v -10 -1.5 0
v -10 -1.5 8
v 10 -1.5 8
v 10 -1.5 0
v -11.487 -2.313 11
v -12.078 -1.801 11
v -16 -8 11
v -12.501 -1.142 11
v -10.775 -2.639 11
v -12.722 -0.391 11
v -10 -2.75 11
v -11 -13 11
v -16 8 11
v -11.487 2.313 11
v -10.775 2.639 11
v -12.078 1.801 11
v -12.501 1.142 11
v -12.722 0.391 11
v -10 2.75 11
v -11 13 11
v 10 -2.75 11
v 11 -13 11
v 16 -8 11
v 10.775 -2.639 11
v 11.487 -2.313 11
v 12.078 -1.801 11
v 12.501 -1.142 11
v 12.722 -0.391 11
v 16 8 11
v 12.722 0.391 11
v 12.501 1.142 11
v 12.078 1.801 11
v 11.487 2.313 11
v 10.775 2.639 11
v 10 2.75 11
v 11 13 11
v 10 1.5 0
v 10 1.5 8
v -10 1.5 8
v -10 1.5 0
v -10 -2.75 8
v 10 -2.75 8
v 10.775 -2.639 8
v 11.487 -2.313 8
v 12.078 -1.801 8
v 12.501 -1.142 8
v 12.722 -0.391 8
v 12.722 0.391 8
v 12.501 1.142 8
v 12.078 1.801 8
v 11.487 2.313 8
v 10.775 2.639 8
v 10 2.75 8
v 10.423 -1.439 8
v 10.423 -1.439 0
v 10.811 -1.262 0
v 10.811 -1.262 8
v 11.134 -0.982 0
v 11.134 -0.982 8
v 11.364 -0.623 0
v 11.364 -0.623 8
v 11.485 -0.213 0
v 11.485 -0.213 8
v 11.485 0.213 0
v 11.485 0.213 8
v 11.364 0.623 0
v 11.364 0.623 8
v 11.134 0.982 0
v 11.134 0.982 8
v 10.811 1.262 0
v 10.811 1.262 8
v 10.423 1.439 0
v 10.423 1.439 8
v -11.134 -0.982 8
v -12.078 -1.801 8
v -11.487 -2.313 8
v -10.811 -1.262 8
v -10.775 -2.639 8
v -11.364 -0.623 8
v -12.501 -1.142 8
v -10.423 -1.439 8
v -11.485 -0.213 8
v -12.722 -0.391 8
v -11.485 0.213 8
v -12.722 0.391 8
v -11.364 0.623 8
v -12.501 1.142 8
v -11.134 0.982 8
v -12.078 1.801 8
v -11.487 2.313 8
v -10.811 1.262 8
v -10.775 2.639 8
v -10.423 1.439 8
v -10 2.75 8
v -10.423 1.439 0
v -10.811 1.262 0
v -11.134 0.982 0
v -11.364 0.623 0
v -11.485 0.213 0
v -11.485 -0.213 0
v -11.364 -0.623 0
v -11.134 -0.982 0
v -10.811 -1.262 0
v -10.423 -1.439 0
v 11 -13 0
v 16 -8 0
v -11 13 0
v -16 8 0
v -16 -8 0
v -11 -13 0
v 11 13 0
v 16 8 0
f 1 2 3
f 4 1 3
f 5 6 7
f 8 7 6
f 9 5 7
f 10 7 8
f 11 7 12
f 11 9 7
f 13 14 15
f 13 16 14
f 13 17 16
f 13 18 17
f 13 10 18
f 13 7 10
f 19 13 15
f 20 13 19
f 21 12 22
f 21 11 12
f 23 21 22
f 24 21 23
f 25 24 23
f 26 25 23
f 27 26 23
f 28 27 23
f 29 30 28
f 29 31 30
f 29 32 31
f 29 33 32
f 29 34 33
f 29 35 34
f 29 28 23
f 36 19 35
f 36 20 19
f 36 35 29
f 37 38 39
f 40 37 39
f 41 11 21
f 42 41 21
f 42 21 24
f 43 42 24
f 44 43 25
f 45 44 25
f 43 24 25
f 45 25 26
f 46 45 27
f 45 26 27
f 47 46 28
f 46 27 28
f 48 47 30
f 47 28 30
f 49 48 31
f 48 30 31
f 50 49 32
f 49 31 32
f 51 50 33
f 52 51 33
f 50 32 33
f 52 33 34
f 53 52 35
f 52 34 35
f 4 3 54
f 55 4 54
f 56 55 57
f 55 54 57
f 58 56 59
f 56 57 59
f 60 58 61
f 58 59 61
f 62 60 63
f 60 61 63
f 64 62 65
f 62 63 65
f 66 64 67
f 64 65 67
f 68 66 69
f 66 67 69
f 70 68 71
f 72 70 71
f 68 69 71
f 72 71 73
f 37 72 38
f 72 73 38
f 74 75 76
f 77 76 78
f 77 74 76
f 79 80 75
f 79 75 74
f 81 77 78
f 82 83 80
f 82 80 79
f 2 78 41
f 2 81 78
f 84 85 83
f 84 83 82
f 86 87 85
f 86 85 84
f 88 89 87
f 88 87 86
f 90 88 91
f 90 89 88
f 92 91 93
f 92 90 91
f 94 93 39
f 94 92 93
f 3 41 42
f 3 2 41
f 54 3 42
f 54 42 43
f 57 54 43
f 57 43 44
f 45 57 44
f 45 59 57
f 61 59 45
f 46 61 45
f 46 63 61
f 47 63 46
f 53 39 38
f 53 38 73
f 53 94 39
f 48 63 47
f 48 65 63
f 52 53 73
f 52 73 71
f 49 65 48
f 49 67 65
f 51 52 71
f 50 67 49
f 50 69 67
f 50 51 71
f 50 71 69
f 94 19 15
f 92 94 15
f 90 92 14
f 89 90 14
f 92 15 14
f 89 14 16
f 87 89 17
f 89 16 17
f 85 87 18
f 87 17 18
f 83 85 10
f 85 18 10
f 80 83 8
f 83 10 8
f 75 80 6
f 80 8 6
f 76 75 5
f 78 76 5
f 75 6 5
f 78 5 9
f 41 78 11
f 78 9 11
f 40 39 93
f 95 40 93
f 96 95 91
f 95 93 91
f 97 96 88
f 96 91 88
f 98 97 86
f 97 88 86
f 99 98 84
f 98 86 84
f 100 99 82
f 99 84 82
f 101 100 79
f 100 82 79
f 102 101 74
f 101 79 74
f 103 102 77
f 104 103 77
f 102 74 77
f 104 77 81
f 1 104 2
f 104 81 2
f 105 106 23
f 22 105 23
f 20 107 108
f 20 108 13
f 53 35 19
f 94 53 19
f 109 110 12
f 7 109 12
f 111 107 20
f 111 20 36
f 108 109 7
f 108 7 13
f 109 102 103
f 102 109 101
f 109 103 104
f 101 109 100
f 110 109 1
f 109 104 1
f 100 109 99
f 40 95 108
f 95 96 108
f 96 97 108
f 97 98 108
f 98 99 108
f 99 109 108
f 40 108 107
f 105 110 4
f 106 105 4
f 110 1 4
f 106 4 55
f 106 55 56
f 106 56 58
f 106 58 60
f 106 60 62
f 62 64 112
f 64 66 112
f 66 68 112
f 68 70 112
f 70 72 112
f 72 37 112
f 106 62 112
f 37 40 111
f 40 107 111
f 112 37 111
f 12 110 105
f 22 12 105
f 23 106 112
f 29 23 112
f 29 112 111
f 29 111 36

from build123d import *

# Parameters (mm, degrees)
SKETCH_W        = 32
SKETCH_H        = 26
PAD_DEPTH       = 11
POCKET_DEPTH    = 15
POCKET001_DEPTH = 3
CHAMFER_SIZE    = 5


with BuildPart() as part:
    # Sketch → Pad (new body)
    with BuildSketch(Plane.XY):
        Rectangle(SKETCH_W, SKETCH_H)
    extrude(amount=PAD_DEPTH)

    # Sketch001 (on Face6 of Pad) → Pocket (cut)
    with BuildSketch(Plane.XY.offset(11)):
        with BuildLine():
            ThreePointArc((-10, 1.5), (-11.5, 0), (-10, -1.5))
            Line((-10, -1.5), (10, -1.5))
            ThreePointArc((10, -1.5), (11.5, 0), (10, 1.5))
            Line((10, 1.5), (-10, 1.5))
        make_face()
    extrude(amount=-POCKET_DEPTH, mode=Mode.SUBTRACT)

    # Sketch002 (on Face5 of Pocket) → Pocket001 (cut)
    with BuildSketch(Plane.XY.offset(11)):
        with BuildLine():
            ThreePointArc((-10, 2.75), (-12.75, 0), (-10, -2.75))
            Line((-10, -2.75), (10, -2.75))
            ThreePointArc((10, -2.75), (12.75, 0), (10, 2.75))
            Line((10, 2.75), (-10, 2.75))
        make_face()
    extrude(amount=-POCKET001_DEPTH, mode=Mode.SUBTRACT)

    # Chamfer
    chamfer_edges = [part.edges().sort_by_distance(p)[0] for p in [
        (-16, -13, 5.5),
        (16, -13, 5.5),
        (16, 13, 5.5),
        (-16, 13, 5.5),
    ]]
    chamfer(chamfer_edges, length=CHAMFER_SIZE)


solid = part.part
